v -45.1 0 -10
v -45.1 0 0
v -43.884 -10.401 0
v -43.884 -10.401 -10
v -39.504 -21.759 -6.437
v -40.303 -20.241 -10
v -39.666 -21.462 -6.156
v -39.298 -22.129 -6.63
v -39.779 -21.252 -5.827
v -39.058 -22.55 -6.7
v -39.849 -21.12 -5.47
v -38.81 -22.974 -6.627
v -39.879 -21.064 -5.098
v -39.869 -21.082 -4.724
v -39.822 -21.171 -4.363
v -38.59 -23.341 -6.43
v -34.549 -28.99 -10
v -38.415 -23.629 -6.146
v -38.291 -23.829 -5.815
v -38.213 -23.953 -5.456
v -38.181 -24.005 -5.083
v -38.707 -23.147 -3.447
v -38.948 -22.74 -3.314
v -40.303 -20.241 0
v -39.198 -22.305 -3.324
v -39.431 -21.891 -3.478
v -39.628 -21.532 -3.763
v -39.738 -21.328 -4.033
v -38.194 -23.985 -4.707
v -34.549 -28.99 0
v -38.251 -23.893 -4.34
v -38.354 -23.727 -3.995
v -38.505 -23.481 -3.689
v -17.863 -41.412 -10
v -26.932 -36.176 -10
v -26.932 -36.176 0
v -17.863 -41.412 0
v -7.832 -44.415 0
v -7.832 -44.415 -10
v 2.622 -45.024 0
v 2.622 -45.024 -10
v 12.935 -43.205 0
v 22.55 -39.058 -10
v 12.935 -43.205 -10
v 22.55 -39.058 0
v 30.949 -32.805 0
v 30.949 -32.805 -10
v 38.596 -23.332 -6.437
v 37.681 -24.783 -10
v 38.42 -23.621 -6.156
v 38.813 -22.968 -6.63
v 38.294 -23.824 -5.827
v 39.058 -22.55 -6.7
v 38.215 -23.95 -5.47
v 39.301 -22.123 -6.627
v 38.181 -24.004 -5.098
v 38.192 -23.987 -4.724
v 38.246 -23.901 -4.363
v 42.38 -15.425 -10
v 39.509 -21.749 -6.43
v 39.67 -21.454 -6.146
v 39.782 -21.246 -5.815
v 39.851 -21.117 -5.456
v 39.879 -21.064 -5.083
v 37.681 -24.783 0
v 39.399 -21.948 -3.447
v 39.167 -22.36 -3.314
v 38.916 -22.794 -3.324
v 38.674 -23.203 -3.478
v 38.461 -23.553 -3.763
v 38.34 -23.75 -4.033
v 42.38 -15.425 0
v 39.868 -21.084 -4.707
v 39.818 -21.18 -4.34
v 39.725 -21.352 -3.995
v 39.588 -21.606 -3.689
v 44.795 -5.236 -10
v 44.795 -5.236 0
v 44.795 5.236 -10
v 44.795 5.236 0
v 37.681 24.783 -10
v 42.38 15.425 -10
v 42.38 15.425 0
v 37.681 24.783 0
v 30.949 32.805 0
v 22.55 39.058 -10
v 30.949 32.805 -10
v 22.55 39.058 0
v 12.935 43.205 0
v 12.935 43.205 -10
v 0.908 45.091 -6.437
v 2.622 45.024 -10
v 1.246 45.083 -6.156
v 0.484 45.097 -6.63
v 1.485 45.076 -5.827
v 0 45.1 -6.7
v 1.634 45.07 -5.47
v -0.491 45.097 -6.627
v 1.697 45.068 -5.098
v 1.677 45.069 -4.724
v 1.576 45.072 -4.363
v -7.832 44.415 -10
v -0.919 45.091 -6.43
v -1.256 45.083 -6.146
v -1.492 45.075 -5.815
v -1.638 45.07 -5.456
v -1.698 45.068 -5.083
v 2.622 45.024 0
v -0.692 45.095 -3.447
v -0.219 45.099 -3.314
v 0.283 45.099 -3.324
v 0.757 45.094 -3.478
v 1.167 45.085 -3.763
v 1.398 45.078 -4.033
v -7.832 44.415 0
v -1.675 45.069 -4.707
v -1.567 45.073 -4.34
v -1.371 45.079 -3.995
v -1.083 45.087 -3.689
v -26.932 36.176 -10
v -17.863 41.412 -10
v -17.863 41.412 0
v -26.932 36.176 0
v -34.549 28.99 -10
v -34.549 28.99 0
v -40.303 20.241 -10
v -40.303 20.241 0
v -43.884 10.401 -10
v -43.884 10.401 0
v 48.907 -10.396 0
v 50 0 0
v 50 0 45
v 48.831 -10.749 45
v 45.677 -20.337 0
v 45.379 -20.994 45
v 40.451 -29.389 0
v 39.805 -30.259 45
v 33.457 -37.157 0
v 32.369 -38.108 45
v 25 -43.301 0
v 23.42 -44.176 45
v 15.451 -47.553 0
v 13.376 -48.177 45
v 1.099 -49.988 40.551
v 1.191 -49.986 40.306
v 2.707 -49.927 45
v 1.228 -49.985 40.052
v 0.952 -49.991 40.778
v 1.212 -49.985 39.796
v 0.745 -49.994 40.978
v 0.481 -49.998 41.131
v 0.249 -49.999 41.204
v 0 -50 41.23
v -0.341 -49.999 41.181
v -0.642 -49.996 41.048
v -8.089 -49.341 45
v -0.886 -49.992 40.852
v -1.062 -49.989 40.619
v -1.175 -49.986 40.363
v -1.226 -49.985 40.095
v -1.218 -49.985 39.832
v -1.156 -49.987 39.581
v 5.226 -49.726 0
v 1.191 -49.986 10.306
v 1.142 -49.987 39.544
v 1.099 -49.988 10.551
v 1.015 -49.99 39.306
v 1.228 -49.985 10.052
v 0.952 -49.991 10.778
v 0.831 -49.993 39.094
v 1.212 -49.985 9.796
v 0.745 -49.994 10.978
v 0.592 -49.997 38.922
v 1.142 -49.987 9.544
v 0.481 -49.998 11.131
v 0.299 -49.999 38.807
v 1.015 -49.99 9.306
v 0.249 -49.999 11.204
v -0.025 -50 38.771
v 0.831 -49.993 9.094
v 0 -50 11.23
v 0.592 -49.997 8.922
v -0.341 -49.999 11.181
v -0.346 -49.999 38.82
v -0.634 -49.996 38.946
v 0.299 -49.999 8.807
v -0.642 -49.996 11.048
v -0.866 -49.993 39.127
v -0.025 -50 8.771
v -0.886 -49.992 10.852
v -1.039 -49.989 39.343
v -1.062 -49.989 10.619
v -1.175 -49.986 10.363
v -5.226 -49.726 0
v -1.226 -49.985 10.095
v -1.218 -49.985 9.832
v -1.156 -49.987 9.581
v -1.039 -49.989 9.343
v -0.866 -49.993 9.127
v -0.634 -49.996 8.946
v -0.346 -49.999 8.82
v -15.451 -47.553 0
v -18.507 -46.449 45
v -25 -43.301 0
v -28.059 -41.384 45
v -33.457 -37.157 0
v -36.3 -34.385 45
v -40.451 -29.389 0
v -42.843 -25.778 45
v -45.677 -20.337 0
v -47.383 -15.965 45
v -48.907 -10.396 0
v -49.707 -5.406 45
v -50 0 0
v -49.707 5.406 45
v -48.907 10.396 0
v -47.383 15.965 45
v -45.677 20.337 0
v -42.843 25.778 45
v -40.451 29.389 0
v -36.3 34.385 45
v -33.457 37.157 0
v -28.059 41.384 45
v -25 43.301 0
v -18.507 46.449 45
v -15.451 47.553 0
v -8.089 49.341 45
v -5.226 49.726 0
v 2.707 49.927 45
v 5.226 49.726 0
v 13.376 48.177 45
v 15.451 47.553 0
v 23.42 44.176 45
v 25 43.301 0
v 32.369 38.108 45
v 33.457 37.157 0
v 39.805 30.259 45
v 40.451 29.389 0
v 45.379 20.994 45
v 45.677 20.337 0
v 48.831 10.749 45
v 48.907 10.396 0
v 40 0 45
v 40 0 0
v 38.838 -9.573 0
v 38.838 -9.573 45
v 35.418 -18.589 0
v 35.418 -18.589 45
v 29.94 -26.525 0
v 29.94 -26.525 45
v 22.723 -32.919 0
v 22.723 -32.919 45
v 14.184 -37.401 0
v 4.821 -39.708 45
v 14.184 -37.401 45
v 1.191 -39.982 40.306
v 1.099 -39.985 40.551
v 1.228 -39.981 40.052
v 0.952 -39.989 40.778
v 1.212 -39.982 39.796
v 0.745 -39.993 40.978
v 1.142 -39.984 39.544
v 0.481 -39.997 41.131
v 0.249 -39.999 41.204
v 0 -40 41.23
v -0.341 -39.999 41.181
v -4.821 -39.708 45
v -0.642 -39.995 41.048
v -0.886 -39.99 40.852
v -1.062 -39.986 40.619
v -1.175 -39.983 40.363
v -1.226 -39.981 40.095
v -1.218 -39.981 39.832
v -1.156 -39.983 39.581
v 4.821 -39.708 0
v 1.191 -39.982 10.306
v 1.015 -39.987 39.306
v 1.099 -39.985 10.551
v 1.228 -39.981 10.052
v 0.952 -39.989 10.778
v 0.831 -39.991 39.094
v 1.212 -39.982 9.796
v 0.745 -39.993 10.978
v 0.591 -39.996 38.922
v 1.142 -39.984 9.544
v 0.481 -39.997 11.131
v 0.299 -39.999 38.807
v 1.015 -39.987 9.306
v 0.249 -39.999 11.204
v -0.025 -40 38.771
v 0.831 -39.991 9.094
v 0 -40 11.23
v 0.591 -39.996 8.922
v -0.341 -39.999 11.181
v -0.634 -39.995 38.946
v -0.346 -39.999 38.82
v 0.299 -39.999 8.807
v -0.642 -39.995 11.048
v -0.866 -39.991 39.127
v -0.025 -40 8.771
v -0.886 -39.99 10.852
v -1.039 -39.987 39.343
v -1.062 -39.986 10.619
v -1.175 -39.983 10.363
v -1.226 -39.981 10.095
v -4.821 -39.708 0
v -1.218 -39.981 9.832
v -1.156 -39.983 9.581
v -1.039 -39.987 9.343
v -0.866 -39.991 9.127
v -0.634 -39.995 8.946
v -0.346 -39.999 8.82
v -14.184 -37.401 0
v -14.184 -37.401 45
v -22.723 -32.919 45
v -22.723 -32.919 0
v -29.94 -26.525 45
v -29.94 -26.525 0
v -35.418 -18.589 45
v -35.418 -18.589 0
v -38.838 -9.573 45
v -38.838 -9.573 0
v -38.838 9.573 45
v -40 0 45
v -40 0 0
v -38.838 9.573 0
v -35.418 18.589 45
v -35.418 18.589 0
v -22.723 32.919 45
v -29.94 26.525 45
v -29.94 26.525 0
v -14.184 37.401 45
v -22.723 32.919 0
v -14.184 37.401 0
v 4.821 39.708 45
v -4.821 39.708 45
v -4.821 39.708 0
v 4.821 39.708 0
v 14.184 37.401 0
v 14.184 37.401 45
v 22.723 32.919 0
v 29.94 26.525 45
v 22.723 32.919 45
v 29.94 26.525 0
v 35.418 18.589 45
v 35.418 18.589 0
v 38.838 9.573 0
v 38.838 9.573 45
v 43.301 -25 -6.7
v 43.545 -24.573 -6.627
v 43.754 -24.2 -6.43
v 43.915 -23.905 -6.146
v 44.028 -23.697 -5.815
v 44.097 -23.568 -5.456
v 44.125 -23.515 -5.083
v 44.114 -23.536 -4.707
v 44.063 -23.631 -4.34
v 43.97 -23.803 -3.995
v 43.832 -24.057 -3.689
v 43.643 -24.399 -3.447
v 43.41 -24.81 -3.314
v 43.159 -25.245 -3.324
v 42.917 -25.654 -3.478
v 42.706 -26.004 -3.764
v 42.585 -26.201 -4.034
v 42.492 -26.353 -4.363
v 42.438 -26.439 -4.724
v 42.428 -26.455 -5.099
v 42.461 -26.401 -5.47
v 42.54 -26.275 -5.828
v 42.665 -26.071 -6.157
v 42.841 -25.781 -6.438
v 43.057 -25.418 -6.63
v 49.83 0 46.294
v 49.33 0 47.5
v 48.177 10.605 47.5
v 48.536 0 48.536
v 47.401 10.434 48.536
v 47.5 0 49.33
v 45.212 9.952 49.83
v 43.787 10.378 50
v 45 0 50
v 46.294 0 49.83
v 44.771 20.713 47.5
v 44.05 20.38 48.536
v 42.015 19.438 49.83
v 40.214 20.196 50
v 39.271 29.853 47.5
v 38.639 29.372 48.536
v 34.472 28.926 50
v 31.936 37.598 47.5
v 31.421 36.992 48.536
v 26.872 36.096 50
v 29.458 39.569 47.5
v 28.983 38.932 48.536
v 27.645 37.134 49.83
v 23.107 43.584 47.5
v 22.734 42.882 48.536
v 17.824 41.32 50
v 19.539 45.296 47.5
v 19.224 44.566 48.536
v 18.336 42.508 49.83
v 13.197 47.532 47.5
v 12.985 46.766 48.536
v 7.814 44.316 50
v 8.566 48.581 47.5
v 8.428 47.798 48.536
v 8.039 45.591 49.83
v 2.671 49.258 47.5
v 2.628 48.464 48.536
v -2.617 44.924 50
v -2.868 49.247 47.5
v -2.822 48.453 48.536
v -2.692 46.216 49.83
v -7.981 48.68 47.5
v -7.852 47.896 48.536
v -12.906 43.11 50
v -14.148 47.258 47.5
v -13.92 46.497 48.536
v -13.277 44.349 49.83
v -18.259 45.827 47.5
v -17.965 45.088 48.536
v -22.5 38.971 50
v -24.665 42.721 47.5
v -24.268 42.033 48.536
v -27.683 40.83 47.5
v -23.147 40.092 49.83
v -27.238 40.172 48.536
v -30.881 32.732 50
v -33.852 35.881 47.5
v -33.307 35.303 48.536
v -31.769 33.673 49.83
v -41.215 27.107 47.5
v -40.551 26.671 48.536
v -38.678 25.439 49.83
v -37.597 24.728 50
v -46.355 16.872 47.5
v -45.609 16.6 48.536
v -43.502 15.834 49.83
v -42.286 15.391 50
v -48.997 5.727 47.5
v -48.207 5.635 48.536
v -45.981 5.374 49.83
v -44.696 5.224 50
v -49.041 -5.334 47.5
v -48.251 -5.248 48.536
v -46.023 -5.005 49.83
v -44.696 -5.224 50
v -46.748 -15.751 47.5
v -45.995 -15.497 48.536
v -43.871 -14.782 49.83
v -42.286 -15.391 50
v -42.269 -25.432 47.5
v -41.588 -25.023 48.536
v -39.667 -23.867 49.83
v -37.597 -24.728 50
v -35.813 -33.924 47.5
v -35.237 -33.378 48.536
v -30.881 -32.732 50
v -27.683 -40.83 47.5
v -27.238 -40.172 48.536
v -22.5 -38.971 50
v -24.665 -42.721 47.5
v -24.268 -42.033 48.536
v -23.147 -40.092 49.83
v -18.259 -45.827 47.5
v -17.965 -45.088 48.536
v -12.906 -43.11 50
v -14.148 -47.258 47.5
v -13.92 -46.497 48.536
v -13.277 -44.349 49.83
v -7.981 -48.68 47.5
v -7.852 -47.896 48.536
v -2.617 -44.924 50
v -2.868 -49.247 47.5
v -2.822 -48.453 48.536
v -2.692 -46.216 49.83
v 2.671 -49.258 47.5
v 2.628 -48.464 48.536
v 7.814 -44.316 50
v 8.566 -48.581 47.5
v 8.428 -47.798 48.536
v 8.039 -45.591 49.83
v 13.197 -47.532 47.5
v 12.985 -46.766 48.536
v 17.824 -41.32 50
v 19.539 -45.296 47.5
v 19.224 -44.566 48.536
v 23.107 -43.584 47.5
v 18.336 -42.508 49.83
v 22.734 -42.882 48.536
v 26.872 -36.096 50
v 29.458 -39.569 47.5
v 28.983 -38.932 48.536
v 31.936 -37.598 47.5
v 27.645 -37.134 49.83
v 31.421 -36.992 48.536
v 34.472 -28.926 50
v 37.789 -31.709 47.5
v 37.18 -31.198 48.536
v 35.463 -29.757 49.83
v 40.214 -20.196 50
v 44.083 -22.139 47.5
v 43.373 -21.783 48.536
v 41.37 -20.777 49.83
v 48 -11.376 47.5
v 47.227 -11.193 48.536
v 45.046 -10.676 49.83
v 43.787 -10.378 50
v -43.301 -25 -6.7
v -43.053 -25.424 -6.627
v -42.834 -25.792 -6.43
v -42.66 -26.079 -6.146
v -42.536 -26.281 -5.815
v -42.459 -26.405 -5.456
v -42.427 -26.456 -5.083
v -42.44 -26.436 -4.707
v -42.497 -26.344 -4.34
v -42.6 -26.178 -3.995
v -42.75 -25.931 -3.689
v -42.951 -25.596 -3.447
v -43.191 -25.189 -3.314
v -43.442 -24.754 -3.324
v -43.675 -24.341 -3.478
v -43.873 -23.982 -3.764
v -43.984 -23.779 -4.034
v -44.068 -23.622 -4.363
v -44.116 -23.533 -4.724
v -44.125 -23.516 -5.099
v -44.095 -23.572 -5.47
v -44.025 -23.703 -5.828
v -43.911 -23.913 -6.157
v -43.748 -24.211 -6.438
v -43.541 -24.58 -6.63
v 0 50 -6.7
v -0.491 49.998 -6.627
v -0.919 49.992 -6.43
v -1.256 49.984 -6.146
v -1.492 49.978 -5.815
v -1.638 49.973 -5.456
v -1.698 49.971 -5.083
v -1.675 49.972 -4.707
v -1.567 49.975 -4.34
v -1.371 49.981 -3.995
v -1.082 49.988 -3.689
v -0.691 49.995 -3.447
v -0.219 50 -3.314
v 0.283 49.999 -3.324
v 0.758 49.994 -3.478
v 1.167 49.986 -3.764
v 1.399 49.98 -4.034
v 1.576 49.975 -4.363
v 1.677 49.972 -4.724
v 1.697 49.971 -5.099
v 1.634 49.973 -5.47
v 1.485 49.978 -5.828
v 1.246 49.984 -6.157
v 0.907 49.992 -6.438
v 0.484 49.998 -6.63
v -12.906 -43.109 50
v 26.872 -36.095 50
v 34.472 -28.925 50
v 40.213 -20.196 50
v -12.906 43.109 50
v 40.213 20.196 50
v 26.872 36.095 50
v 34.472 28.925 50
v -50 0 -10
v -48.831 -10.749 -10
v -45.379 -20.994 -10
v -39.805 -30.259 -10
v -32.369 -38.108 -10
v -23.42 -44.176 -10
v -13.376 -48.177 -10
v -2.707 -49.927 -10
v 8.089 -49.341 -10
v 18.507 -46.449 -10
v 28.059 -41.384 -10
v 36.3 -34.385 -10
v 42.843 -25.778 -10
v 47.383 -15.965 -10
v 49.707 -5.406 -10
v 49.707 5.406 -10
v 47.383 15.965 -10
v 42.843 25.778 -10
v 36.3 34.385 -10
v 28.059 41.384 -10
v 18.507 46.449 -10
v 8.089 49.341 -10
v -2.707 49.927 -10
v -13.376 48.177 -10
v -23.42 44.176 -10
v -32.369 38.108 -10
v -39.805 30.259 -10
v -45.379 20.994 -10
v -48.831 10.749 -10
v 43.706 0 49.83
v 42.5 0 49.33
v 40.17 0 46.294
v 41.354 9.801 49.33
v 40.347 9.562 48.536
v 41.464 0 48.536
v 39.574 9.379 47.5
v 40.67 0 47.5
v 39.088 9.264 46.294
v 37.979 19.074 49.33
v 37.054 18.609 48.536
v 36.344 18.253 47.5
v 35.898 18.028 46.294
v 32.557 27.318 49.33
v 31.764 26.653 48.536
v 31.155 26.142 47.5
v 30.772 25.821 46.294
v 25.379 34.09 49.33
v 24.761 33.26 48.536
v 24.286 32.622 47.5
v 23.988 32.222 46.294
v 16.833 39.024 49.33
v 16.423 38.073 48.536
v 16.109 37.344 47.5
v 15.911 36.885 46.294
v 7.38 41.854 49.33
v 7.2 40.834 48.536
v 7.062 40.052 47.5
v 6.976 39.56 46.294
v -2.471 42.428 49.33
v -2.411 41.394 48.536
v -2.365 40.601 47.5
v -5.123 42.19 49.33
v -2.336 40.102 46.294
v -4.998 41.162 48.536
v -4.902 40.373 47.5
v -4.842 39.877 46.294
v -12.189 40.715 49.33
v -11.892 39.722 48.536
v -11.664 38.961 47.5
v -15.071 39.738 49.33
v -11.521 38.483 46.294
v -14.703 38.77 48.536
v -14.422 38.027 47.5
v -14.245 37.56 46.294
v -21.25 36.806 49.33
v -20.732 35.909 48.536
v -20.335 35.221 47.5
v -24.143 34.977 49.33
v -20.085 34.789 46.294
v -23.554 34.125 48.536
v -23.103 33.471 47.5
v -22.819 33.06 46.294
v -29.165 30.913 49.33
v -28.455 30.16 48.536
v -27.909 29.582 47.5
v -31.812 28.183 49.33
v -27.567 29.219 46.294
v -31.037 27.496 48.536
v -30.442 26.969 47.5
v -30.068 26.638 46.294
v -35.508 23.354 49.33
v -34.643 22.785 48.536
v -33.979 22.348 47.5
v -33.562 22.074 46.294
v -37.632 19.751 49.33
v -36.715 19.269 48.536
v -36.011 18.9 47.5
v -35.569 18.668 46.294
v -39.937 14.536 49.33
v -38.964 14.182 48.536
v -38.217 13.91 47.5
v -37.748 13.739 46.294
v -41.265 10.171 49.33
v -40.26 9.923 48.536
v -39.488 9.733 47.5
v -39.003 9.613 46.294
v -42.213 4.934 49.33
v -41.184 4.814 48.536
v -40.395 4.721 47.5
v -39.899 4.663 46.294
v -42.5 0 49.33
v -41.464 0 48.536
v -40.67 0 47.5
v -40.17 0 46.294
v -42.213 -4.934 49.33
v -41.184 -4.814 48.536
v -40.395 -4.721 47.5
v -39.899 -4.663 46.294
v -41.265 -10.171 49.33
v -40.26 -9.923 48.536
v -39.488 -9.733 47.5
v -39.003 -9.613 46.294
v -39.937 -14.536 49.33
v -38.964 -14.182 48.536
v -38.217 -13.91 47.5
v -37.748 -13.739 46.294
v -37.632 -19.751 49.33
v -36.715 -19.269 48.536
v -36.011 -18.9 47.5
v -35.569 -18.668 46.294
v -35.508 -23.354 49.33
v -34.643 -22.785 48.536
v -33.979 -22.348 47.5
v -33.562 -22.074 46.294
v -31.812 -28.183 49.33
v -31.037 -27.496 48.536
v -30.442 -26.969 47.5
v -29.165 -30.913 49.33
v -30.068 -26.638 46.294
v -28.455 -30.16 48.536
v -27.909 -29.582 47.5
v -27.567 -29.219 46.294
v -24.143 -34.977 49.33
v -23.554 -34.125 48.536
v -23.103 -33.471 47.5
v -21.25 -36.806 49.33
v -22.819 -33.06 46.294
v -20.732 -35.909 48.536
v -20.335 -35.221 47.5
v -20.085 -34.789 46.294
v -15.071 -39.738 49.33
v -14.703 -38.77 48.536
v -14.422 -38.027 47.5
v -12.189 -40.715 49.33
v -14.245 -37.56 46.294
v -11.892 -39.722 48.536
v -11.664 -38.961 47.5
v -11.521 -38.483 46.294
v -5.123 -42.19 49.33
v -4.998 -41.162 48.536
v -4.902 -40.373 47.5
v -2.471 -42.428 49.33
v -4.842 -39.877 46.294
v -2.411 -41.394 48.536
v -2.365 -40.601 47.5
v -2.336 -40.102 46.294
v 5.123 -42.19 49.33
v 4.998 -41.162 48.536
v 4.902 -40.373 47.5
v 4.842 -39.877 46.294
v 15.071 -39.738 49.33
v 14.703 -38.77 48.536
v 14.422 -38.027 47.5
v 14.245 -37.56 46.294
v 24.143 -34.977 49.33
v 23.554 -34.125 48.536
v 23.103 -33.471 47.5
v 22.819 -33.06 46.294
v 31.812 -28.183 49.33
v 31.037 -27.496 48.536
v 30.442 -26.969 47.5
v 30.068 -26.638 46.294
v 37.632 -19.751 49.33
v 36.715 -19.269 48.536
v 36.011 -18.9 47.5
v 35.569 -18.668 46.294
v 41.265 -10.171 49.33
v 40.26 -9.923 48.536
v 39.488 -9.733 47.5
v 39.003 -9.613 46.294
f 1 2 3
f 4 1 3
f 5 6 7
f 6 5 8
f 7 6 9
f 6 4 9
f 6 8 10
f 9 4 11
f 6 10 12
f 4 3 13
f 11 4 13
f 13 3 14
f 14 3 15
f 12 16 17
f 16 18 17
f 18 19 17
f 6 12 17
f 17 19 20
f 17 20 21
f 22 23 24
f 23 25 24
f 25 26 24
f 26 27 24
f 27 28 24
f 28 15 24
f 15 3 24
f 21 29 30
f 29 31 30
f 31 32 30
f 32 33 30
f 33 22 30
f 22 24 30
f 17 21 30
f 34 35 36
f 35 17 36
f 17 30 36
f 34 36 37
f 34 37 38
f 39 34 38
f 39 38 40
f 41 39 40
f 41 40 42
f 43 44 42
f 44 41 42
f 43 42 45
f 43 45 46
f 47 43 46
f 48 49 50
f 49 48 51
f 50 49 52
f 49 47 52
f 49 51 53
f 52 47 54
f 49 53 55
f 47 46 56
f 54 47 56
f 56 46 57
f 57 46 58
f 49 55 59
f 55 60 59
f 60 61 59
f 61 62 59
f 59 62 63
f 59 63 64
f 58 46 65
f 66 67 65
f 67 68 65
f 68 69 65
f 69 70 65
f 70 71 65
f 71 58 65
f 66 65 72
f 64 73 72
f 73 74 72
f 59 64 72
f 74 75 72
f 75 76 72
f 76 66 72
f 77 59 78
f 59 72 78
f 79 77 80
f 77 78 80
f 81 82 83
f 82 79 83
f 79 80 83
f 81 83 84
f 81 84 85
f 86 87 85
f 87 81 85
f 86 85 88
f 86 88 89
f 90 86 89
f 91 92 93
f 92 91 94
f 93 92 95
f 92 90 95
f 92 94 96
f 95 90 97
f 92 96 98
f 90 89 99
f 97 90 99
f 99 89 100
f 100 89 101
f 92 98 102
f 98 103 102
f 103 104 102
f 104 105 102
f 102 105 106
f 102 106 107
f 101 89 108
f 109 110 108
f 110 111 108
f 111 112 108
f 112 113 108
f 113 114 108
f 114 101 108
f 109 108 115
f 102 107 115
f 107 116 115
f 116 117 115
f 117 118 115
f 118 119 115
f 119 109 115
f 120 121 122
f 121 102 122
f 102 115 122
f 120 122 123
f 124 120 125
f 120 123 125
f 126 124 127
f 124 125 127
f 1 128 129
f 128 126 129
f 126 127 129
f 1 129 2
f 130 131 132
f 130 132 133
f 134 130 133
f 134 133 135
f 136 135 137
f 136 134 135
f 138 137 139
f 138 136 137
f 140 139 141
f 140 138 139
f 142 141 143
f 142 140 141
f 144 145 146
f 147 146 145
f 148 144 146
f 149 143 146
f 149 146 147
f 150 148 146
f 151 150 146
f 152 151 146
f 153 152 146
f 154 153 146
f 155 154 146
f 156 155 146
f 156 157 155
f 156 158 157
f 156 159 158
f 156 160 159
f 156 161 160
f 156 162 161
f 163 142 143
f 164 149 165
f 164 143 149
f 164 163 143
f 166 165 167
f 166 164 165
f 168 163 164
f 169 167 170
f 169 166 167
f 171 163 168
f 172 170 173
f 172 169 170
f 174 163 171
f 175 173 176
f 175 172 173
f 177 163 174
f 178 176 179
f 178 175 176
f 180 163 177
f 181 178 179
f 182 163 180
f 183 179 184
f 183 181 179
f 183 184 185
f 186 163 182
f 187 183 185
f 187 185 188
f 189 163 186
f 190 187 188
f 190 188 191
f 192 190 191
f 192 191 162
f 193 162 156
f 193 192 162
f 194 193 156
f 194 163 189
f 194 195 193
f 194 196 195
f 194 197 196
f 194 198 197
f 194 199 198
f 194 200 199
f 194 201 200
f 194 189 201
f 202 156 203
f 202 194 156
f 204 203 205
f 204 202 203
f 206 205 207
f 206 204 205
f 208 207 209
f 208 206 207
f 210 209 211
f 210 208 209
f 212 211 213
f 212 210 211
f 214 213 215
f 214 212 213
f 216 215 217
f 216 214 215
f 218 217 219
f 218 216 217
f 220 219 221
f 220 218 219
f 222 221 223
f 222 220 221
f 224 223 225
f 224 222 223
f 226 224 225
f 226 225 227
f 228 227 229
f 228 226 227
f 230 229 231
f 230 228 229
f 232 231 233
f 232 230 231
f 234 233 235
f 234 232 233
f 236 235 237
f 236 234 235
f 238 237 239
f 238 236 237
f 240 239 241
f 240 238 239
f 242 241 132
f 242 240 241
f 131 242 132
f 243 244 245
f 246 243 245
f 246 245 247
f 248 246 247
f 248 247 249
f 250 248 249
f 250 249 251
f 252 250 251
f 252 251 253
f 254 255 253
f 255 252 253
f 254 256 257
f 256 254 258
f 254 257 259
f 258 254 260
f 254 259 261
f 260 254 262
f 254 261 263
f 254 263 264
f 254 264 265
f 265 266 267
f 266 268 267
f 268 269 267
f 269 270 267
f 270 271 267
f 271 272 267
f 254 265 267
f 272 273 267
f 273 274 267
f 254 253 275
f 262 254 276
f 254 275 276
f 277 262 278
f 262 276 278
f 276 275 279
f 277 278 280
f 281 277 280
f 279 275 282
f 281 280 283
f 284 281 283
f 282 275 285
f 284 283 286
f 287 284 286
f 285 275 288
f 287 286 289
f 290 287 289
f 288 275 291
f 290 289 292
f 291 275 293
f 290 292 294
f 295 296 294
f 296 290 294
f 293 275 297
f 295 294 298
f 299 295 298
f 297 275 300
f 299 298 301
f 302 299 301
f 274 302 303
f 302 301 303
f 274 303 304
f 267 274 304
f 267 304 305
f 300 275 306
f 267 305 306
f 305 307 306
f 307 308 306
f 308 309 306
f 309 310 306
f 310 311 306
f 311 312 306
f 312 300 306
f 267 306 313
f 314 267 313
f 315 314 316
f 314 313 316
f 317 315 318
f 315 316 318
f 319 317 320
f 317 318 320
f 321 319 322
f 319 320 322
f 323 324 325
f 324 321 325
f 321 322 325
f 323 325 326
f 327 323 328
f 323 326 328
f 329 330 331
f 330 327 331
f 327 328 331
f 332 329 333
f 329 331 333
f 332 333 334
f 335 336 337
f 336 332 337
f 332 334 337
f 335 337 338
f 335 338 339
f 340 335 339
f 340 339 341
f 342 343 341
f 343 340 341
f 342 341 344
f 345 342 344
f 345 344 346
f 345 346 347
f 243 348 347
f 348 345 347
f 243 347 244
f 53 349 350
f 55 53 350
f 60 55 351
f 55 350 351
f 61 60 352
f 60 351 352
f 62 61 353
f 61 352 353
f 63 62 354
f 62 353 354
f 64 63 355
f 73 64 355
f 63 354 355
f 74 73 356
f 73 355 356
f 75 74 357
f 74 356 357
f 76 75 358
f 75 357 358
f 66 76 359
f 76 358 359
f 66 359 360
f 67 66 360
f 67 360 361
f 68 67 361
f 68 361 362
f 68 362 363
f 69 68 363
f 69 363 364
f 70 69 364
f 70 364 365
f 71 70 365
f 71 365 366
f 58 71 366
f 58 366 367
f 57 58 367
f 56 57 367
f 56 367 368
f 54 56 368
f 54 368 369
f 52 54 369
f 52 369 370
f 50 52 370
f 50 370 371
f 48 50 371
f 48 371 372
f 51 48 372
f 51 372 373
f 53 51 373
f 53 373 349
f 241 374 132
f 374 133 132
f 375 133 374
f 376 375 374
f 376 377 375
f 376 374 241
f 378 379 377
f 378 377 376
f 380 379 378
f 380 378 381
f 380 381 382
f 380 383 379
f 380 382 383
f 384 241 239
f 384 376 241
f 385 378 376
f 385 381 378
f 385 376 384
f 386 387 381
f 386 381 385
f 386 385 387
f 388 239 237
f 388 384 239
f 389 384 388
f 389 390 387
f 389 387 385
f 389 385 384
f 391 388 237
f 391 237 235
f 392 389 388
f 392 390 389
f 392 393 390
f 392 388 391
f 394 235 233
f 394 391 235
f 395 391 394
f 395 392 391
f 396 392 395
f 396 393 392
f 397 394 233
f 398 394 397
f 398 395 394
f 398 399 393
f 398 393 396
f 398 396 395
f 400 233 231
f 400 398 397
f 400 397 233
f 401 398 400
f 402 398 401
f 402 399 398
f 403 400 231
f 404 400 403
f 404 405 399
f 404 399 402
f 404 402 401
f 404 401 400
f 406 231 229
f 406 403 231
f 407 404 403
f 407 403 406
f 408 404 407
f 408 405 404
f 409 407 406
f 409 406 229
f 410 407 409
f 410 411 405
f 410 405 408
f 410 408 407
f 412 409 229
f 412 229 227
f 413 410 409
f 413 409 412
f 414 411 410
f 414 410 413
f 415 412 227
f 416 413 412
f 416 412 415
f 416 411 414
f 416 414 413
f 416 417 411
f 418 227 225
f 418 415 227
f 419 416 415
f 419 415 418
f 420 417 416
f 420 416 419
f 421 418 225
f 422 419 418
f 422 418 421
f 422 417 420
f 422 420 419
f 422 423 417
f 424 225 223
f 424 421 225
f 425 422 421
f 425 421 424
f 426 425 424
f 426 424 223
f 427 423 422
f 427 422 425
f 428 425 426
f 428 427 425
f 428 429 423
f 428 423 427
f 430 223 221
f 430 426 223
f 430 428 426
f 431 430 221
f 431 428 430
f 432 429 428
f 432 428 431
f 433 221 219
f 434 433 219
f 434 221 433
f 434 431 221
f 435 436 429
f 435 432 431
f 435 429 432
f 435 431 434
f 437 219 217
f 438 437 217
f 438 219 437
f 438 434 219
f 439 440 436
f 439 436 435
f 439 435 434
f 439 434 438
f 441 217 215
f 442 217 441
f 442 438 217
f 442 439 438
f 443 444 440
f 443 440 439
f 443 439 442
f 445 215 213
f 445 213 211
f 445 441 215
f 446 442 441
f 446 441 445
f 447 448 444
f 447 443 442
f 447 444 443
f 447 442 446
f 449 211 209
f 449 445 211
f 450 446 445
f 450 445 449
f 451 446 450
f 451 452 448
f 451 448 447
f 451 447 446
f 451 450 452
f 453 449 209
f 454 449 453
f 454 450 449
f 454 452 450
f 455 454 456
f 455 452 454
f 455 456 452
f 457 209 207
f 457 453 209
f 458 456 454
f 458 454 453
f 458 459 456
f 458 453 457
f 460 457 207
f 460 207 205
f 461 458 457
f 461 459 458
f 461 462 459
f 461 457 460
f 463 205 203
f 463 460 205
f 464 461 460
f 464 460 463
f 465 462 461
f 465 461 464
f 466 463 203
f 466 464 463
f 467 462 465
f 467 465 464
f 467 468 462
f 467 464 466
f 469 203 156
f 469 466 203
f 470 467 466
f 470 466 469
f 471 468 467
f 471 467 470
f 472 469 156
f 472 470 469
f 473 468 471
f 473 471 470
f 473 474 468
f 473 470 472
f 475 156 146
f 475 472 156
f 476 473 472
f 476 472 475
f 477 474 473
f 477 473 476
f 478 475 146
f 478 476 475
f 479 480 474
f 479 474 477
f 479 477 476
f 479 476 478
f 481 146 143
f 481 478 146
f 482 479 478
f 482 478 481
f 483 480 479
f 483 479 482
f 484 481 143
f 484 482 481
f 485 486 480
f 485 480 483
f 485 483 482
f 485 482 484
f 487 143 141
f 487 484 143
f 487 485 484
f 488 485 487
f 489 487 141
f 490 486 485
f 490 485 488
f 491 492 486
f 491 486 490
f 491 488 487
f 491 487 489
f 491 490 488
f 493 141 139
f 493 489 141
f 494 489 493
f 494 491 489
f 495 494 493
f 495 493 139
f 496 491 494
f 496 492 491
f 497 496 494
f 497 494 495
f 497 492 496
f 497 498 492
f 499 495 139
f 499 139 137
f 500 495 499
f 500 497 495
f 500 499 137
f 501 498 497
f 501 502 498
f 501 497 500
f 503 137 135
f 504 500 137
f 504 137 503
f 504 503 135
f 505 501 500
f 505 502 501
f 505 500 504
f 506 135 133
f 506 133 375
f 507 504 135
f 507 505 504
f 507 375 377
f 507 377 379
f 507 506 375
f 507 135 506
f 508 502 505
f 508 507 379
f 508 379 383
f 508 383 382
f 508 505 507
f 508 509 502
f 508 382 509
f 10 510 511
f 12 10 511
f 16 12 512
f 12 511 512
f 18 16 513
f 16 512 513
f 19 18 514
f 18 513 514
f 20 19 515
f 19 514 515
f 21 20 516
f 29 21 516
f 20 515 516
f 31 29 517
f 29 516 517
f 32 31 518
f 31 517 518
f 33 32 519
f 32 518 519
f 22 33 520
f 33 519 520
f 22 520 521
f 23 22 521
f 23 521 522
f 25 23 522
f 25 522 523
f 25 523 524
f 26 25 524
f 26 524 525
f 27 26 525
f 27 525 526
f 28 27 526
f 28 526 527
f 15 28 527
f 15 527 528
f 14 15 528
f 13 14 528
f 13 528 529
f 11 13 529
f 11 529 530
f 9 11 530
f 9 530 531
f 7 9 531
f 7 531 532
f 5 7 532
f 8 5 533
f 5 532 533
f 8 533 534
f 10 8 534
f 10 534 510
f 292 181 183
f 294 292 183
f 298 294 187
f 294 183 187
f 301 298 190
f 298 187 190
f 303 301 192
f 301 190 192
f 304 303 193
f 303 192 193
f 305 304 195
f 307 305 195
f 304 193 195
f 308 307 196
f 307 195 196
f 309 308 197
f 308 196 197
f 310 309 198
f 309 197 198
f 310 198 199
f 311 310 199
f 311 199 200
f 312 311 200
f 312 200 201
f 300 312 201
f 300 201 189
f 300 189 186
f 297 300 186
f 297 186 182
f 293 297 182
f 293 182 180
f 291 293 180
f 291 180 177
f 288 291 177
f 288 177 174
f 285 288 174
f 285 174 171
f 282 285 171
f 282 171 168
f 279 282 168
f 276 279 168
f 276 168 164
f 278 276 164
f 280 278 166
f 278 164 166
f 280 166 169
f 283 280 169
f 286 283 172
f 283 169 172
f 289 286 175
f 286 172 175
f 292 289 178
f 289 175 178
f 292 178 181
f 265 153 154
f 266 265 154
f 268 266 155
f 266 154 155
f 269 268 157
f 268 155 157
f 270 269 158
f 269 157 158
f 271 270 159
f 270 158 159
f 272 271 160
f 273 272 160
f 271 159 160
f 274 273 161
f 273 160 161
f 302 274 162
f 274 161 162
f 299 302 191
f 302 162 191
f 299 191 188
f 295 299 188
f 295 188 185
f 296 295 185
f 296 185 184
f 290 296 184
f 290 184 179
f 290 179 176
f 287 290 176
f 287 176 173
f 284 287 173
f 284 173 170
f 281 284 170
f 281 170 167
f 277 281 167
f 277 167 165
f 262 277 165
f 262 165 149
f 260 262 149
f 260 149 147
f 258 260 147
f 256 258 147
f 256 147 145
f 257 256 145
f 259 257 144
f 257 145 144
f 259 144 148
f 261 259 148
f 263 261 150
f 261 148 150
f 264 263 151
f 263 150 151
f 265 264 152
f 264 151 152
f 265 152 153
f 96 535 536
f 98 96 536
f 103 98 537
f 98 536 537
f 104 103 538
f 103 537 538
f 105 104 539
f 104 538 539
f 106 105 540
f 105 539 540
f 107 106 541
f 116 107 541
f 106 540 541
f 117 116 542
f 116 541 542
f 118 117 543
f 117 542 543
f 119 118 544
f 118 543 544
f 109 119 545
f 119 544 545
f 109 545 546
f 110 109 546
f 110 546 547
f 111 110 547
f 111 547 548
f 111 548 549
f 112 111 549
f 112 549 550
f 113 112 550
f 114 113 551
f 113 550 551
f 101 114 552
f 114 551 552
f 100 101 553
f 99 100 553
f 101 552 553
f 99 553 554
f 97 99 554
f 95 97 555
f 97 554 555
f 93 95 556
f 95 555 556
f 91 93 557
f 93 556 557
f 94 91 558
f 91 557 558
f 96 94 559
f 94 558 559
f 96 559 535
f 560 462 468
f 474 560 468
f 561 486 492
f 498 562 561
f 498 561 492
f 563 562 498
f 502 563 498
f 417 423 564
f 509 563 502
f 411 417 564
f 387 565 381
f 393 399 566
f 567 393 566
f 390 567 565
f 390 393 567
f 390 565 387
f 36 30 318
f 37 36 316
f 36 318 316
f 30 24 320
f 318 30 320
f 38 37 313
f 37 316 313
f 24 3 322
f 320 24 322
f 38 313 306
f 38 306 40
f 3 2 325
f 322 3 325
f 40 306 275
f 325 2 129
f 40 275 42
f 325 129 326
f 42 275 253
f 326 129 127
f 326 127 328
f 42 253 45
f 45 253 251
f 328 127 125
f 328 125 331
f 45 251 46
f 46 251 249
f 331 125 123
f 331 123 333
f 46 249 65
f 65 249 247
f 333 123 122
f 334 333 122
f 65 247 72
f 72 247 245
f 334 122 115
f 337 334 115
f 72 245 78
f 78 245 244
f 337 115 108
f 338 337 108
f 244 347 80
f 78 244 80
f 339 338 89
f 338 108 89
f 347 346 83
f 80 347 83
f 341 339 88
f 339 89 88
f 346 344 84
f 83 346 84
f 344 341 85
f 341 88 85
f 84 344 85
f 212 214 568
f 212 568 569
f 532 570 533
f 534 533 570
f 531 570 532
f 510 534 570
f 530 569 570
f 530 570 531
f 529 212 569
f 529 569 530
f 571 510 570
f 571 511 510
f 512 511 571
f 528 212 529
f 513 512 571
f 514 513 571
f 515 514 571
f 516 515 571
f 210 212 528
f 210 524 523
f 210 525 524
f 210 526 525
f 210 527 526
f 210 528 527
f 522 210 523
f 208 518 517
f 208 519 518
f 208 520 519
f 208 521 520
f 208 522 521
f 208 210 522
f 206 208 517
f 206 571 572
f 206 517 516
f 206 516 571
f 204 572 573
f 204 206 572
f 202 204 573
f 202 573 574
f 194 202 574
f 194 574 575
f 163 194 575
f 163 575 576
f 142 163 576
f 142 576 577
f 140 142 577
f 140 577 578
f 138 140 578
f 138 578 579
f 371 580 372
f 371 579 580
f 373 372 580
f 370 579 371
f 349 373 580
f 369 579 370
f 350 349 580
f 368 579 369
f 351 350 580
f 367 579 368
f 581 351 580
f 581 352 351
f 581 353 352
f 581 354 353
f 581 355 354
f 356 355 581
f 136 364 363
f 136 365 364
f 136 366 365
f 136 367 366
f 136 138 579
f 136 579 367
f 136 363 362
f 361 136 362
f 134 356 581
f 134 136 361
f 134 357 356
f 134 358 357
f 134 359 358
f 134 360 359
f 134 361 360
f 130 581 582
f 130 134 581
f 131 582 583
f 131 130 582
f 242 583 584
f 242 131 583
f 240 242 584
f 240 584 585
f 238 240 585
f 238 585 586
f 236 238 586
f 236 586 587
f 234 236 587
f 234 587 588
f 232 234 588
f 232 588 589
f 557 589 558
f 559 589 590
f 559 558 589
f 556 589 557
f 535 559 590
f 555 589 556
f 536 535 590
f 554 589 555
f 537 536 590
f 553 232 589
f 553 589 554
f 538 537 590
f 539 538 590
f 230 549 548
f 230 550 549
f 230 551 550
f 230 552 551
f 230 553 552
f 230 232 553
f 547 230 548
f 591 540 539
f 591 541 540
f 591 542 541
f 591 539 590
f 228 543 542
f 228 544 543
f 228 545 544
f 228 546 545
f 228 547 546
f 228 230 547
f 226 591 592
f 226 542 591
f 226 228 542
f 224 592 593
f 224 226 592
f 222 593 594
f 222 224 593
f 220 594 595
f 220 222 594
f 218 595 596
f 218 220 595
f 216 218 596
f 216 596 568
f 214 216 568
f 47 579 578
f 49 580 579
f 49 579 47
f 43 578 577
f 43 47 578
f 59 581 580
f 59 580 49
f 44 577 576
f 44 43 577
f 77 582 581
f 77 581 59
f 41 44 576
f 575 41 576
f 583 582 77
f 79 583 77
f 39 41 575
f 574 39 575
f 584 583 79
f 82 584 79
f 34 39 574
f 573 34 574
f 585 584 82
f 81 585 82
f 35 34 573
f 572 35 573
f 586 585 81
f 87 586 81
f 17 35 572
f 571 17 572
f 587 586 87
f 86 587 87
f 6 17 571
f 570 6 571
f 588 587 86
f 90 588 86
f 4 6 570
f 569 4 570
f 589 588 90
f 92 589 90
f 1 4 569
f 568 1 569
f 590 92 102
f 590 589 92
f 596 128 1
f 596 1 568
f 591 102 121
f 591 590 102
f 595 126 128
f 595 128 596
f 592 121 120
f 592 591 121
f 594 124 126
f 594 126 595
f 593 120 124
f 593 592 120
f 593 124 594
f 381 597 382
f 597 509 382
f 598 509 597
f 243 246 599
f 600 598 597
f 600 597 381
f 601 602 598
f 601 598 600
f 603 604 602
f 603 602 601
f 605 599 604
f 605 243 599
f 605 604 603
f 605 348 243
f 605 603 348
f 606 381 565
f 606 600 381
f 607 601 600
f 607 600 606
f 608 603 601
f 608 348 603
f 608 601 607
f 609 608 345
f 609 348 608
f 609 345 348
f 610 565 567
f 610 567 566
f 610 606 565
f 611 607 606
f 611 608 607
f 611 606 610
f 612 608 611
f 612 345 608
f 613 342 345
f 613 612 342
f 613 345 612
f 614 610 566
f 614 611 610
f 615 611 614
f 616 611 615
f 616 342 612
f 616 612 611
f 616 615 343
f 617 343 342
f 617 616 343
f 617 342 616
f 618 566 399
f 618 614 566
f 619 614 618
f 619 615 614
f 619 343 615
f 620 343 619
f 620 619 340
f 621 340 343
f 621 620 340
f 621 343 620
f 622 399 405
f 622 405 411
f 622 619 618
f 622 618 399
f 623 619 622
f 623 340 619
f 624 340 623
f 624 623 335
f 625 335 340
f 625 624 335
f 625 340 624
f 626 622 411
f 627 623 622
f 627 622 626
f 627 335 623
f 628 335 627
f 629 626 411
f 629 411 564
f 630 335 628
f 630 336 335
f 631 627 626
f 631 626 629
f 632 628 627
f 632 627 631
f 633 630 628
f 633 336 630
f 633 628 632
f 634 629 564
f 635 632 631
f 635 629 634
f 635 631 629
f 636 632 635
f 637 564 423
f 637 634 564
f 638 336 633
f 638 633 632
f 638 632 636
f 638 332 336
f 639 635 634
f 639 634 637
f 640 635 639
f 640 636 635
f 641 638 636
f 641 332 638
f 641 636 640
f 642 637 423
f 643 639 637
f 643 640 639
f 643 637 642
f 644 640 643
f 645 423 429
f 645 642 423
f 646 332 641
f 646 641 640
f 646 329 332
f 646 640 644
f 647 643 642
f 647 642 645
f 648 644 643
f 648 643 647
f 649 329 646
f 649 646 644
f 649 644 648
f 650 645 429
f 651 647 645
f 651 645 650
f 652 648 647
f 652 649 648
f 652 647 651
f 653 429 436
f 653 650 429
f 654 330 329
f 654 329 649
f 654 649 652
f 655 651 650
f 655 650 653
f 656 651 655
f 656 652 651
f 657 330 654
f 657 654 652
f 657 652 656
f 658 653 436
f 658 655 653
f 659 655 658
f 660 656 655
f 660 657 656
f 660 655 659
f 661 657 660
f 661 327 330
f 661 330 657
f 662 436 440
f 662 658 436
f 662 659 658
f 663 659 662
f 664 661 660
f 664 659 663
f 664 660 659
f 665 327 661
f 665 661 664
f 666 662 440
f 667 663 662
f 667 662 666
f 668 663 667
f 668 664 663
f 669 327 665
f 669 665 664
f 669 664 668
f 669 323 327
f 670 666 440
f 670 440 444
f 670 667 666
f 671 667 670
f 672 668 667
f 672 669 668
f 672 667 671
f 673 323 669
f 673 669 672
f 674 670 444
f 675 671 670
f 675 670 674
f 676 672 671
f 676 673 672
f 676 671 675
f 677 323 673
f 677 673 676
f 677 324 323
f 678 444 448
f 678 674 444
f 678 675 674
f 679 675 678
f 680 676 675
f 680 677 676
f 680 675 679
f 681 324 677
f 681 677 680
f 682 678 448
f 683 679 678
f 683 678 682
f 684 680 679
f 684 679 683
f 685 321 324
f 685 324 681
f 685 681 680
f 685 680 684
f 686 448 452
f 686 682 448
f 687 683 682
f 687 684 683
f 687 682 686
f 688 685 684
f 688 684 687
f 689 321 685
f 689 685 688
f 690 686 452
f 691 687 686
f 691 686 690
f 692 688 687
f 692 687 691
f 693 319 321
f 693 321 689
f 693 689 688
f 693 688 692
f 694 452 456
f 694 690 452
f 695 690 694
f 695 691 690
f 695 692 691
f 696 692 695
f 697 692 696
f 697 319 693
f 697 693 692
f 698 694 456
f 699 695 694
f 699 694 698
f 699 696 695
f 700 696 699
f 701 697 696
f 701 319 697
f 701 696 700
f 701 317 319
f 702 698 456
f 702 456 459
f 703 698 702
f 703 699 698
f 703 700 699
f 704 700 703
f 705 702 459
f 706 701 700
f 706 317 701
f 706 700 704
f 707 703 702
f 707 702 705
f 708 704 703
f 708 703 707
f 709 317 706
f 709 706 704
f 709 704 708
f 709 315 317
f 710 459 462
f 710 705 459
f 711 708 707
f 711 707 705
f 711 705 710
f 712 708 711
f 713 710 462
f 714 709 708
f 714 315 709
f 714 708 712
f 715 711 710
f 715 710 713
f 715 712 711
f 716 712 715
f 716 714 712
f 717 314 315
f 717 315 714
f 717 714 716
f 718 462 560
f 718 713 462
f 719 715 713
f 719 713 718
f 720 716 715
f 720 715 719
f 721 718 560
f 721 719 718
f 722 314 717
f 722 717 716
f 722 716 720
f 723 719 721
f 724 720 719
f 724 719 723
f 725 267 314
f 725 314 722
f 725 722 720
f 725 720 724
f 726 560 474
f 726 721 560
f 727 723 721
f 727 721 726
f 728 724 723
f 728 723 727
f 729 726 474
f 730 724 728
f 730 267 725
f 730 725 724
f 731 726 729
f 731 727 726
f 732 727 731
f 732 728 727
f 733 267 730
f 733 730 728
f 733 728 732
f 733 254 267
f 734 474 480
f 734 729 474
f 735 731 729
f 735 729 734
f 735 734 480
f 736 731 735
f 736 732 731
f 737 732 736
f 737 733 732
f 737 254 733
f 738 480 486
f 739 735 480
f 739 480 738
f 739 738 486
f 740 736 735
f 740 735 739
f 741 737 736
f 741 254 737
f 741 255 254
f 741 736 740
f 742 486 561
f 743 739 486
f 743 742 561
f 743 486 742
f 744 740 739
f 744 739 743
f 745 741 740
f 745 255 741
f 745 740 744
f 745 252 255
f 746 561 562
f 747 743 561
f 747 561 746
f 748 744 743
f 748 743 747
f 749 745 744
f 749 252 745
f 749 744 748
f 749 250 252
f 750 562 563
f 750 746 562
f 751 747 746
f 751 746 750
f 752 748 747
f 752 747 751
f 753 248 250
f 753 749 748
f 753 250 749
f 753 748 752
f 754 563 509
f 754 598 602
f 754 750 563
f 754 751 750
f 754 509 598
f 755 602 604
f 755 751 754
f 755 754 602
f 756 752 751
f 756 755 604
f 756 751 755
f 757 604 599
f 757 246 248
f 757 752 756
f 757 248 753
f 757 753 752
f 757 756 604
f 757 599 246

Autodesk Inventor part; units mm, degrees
ref_plane "YZ Plane" through (0, 0, 0) normal (1, 0, 0) x (0, 1, 0)
ref_plane "XZ Plane" through (0, 0, 0) normal (0, 1, 0) x (-1, 0, 0)
ref_plane "XY Plane" through (0, 0, 0) normal (0, 0, 1) x (1, 0, 0)
sketch "Sketch1" plane through (0, 0, 0) normal (0, 0, 1) x (1, 0, 0)
  circle A0 centre (0, 0) radius 40
  circle A1 centre (0, 0) radius 50
  dimension "d0" = 80
  dimension "d1" = 100
extrude "Extrusion1" add sketch "Sketch1" along normal blind 50
sketch "Sketch2" plane through (0, 0, 0) normal (0, 0, -1) x (-1, 0, 0)
  circle A0 centre (0, 0) radius 45.1
  circle A1 centre (0, 0) radius 50 projected
  dimension "d5" = 90.2
extrude "Extrusion2" add sketch "Sketch2" along normal blind 10
sketch "Sketch3" plane through (0, 0, 0) normal (0, 1, 0) x (-1, 0, 0)
  line L0 (-50, -10) -> (50, -10) construction
  point P0 (0, 0)
  point P1 (0, -5)
  dimension "d8" = 5
hole "Hole1" at (0, 0, -5) direction (0, 1, 0) diameter 3.4 end through all clearance for "Socket Head Cap Screw DIN EN ISO 4762" size "M3" standard "DIN"
pattern_circular "Circular Pattern1" count 3 over 360 about axis through (0, 0, -10) along (0, 0, 1) of "Hole1"
fillet "Fillet1" radius 5 2 edges at (-50, 0, 50) (-40, 0, 50)
sketch "Sketch4" plane through (0, 0, 0) normal (0, 1, 0) x (-1, 0, 0)
  point P0 (0, 0)
  point P1 (0, 40)
  point P2 (0, 10)
  dimension "d19" = 10
  dimension "d20" = 40
hole "Hole2" at (0, 0, 40) at (0, 0, 10) direction (0, -1, 0) diameter 2.459 end through all thread size "M3x0.5" class "6H" standard "ANSI Metric M Profile"
properties part number "Nose"
